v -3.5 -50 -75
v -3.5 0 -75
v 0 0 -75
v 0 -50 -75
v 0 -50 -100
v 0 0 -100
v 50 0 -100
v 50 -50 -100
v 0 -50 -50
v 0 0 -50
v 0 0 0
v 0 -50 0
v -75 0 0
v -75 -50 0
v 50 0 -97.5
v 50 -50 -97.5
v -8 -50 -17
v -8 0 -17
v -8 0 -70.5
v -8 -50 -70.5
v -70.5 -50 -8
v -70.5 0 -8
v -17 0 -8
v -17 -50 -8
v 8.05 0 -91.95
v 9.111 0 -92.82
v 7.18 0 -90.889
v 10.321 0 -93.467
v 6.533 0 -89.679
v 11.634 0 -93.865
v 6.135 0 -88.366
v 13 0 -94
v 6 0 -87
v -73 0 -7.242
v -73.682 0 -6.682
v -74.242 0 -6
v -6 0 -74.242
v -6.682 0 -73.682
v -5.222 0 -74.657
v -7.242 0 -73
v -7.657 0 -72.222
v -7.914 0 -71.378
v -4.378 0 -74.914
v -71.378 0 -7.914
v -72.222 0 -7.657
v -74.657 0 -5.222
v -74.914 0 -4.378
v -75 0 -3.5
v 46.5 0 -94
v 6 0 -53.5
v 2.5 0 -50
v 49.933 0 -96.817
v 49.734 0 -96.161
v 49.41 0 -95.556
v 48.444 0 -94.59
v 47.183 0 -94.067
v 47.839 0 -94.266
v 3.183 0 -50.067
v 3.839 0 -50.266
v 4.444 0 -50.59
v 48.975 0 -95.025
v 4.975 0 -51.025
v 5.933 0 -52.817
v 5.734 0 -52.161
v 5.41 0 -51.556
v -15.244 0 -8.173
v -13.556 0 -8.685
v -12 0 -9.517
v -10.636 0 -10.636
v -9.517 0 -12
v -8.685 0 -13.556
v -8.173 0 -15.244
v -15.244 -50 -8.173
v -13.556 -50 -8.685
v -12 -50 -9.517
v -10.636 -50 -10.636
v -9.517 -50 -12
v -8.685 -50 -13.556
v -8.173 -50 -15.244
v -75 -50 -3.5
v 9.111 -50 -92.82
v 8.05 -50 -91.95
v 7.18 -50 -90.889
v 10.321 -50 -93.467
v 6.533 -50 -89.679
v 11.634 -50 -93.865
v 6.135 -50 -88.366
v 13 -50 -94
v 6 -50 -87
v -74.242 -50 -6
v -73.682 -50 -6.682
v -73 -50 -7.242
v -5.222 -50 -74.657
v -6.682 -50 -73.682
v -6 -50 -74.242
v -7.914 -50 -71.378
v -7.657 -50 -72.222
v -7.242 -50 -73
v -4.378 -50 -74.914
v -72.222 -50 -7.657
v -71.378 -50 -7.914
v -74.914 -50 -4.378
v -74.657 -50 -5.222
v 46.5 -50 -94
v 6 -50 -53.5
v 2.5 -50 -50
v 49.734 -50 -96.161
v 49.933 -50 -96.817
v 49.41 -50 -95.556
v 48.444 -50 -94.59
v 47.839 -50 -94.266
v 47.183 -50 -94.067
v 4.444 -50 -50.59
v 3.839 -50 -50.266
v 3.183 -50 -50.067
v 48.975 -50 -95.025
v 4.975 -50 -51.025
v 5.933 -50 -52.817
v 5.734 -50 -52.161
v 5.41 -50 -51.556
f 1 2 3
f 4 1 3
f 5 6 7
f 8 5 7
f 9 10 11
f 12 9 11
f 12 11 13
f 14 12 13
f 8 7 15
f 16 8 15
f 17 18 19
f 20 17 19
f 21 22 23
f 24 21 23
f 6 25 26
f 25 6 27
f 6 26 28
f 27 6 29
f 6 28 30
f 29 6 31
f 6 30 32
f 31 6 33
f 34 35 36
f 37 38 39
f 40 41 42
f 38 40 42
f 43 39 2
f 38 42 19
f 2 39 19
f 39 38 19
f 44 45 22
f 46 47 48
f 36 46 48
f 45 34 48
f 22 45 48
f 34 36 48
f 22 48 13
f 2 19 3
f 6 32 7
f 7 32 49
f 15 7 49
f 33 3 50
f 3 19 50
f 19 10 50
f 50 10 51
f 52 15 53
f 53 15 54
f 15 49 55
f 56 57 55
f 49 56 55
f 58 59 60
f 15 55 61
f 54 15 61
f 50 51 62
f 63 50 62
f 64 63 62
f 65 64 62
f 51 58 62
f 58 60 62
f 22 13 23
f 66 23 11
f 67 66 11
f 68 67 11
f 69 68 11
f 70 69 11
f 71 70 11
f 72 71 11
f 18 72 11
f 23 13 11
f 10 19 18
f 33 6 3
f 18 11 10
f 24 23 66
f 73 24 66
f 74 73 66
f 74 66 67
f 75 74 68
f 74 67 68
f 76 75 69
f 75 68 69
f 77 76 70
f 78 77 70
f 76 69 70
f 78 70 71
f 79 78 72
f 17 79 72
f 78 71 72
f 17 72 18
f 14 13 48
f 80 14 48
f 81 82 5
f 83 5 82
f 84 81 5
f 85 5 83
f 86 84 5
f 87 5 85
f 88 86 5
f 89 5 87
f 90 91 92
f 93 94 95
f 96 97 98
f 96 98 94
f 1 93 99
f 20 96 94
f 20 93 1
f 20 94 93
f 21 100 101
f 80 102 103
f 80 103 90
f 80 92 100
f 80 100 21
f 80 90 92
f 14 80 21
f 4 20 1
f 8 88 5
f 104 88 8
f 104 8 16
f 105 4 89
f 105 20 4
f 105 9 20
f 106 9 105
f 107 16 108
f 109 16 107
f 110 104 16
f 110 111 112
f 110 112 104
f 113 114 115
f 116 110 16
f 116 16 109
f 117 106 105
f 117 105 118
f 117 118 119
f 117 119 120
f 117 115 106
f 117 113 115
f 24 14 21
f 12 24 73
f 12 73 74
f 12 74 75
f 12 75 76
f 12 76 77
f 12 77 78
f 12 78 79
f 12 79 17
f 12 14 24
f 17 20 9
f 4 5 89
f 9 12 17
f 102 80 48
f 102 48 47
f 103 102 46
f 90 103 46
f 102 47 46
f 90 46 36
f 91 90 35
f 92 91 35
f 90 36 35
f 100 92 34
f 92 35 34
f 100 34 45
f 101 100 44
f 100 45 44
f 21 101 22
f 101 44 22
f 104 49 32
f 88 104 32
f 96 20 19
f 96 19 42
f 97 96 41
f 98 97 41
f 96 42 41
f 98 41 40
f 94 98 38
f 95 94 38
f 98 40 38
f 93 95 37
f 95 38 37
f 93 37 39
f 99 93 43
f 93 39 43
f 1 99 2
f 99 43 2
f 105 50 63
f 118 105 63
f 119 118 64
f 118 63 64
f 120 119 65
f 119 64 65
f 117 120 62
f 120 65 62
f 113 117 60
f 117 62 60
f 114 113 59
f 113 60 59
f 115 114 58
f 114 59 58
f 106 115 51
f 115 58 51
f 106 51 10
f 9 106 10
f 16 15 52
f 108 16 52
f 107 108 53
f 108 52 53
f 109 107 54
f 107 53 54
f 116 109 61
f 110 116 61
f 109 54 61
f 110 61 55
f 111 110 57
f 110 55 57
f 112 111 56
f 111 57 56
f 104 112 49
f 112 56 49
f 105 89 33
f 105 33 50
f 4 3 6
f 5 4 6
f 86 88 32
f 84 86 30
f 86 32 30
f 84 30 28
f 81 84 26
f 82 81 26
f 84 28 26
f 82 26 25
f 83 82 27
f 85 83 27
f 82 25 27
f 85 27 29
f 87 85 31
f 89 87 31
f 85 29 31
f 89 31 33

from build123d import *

# Parameters (mm, degrees)
F1_DEPTH = 50


with BuildPart() as f1:
    # F0 (on Front) → F1 (new body)
    with BuildSketch(Plane.XZ):
        with BuildLine():
            Line((0, 0), (-75, 0))
            Line((-75, 0), (-75, -3.5))
            ThreePointArc((-75, -3.5), (-73.681981, -6.681981), (-70.5, -8))
            Line((-70.5, -8), (-17, -8))
            ThreePointArc((-17, -8), (-10.636039, -10.636039), (-8, -17))
            Line((-8, -17), (-8, -70.5))
            ThreePointArc((-8, -70.5), (-6.681981, -73.681981), (-3.5, -75))
            Line((-3.5, -75), (0, -75))
            Line((0, -75), (0, -50))
            Line((0, -50), (0, 0))
        make_face()
        with BuildLine():
            Line((2.5, -50), (0, -50))
            Line((0, -50), (0, -75))
            Line((0, -75), (0, -100))
            Line((0, -100), (50, -100))
            Line((50, -100), (50, -97.5))
            ThreePointArc((50, -97.5), (48.974874, -95.025126), (46.5, -94))
            Line((46.5, -94), (13, -94))
            ThreePointArc((13, -94), (8.050253, -91.949747), (6, -87))
            Line((6, -87), (6, -53.5))
            ThreePointArc((6, -53.5), (4.974874, -51.025126), (2.5, -50))
        make_face()
    extrude(amount=F1_DEPTH)


solid = f1.part
